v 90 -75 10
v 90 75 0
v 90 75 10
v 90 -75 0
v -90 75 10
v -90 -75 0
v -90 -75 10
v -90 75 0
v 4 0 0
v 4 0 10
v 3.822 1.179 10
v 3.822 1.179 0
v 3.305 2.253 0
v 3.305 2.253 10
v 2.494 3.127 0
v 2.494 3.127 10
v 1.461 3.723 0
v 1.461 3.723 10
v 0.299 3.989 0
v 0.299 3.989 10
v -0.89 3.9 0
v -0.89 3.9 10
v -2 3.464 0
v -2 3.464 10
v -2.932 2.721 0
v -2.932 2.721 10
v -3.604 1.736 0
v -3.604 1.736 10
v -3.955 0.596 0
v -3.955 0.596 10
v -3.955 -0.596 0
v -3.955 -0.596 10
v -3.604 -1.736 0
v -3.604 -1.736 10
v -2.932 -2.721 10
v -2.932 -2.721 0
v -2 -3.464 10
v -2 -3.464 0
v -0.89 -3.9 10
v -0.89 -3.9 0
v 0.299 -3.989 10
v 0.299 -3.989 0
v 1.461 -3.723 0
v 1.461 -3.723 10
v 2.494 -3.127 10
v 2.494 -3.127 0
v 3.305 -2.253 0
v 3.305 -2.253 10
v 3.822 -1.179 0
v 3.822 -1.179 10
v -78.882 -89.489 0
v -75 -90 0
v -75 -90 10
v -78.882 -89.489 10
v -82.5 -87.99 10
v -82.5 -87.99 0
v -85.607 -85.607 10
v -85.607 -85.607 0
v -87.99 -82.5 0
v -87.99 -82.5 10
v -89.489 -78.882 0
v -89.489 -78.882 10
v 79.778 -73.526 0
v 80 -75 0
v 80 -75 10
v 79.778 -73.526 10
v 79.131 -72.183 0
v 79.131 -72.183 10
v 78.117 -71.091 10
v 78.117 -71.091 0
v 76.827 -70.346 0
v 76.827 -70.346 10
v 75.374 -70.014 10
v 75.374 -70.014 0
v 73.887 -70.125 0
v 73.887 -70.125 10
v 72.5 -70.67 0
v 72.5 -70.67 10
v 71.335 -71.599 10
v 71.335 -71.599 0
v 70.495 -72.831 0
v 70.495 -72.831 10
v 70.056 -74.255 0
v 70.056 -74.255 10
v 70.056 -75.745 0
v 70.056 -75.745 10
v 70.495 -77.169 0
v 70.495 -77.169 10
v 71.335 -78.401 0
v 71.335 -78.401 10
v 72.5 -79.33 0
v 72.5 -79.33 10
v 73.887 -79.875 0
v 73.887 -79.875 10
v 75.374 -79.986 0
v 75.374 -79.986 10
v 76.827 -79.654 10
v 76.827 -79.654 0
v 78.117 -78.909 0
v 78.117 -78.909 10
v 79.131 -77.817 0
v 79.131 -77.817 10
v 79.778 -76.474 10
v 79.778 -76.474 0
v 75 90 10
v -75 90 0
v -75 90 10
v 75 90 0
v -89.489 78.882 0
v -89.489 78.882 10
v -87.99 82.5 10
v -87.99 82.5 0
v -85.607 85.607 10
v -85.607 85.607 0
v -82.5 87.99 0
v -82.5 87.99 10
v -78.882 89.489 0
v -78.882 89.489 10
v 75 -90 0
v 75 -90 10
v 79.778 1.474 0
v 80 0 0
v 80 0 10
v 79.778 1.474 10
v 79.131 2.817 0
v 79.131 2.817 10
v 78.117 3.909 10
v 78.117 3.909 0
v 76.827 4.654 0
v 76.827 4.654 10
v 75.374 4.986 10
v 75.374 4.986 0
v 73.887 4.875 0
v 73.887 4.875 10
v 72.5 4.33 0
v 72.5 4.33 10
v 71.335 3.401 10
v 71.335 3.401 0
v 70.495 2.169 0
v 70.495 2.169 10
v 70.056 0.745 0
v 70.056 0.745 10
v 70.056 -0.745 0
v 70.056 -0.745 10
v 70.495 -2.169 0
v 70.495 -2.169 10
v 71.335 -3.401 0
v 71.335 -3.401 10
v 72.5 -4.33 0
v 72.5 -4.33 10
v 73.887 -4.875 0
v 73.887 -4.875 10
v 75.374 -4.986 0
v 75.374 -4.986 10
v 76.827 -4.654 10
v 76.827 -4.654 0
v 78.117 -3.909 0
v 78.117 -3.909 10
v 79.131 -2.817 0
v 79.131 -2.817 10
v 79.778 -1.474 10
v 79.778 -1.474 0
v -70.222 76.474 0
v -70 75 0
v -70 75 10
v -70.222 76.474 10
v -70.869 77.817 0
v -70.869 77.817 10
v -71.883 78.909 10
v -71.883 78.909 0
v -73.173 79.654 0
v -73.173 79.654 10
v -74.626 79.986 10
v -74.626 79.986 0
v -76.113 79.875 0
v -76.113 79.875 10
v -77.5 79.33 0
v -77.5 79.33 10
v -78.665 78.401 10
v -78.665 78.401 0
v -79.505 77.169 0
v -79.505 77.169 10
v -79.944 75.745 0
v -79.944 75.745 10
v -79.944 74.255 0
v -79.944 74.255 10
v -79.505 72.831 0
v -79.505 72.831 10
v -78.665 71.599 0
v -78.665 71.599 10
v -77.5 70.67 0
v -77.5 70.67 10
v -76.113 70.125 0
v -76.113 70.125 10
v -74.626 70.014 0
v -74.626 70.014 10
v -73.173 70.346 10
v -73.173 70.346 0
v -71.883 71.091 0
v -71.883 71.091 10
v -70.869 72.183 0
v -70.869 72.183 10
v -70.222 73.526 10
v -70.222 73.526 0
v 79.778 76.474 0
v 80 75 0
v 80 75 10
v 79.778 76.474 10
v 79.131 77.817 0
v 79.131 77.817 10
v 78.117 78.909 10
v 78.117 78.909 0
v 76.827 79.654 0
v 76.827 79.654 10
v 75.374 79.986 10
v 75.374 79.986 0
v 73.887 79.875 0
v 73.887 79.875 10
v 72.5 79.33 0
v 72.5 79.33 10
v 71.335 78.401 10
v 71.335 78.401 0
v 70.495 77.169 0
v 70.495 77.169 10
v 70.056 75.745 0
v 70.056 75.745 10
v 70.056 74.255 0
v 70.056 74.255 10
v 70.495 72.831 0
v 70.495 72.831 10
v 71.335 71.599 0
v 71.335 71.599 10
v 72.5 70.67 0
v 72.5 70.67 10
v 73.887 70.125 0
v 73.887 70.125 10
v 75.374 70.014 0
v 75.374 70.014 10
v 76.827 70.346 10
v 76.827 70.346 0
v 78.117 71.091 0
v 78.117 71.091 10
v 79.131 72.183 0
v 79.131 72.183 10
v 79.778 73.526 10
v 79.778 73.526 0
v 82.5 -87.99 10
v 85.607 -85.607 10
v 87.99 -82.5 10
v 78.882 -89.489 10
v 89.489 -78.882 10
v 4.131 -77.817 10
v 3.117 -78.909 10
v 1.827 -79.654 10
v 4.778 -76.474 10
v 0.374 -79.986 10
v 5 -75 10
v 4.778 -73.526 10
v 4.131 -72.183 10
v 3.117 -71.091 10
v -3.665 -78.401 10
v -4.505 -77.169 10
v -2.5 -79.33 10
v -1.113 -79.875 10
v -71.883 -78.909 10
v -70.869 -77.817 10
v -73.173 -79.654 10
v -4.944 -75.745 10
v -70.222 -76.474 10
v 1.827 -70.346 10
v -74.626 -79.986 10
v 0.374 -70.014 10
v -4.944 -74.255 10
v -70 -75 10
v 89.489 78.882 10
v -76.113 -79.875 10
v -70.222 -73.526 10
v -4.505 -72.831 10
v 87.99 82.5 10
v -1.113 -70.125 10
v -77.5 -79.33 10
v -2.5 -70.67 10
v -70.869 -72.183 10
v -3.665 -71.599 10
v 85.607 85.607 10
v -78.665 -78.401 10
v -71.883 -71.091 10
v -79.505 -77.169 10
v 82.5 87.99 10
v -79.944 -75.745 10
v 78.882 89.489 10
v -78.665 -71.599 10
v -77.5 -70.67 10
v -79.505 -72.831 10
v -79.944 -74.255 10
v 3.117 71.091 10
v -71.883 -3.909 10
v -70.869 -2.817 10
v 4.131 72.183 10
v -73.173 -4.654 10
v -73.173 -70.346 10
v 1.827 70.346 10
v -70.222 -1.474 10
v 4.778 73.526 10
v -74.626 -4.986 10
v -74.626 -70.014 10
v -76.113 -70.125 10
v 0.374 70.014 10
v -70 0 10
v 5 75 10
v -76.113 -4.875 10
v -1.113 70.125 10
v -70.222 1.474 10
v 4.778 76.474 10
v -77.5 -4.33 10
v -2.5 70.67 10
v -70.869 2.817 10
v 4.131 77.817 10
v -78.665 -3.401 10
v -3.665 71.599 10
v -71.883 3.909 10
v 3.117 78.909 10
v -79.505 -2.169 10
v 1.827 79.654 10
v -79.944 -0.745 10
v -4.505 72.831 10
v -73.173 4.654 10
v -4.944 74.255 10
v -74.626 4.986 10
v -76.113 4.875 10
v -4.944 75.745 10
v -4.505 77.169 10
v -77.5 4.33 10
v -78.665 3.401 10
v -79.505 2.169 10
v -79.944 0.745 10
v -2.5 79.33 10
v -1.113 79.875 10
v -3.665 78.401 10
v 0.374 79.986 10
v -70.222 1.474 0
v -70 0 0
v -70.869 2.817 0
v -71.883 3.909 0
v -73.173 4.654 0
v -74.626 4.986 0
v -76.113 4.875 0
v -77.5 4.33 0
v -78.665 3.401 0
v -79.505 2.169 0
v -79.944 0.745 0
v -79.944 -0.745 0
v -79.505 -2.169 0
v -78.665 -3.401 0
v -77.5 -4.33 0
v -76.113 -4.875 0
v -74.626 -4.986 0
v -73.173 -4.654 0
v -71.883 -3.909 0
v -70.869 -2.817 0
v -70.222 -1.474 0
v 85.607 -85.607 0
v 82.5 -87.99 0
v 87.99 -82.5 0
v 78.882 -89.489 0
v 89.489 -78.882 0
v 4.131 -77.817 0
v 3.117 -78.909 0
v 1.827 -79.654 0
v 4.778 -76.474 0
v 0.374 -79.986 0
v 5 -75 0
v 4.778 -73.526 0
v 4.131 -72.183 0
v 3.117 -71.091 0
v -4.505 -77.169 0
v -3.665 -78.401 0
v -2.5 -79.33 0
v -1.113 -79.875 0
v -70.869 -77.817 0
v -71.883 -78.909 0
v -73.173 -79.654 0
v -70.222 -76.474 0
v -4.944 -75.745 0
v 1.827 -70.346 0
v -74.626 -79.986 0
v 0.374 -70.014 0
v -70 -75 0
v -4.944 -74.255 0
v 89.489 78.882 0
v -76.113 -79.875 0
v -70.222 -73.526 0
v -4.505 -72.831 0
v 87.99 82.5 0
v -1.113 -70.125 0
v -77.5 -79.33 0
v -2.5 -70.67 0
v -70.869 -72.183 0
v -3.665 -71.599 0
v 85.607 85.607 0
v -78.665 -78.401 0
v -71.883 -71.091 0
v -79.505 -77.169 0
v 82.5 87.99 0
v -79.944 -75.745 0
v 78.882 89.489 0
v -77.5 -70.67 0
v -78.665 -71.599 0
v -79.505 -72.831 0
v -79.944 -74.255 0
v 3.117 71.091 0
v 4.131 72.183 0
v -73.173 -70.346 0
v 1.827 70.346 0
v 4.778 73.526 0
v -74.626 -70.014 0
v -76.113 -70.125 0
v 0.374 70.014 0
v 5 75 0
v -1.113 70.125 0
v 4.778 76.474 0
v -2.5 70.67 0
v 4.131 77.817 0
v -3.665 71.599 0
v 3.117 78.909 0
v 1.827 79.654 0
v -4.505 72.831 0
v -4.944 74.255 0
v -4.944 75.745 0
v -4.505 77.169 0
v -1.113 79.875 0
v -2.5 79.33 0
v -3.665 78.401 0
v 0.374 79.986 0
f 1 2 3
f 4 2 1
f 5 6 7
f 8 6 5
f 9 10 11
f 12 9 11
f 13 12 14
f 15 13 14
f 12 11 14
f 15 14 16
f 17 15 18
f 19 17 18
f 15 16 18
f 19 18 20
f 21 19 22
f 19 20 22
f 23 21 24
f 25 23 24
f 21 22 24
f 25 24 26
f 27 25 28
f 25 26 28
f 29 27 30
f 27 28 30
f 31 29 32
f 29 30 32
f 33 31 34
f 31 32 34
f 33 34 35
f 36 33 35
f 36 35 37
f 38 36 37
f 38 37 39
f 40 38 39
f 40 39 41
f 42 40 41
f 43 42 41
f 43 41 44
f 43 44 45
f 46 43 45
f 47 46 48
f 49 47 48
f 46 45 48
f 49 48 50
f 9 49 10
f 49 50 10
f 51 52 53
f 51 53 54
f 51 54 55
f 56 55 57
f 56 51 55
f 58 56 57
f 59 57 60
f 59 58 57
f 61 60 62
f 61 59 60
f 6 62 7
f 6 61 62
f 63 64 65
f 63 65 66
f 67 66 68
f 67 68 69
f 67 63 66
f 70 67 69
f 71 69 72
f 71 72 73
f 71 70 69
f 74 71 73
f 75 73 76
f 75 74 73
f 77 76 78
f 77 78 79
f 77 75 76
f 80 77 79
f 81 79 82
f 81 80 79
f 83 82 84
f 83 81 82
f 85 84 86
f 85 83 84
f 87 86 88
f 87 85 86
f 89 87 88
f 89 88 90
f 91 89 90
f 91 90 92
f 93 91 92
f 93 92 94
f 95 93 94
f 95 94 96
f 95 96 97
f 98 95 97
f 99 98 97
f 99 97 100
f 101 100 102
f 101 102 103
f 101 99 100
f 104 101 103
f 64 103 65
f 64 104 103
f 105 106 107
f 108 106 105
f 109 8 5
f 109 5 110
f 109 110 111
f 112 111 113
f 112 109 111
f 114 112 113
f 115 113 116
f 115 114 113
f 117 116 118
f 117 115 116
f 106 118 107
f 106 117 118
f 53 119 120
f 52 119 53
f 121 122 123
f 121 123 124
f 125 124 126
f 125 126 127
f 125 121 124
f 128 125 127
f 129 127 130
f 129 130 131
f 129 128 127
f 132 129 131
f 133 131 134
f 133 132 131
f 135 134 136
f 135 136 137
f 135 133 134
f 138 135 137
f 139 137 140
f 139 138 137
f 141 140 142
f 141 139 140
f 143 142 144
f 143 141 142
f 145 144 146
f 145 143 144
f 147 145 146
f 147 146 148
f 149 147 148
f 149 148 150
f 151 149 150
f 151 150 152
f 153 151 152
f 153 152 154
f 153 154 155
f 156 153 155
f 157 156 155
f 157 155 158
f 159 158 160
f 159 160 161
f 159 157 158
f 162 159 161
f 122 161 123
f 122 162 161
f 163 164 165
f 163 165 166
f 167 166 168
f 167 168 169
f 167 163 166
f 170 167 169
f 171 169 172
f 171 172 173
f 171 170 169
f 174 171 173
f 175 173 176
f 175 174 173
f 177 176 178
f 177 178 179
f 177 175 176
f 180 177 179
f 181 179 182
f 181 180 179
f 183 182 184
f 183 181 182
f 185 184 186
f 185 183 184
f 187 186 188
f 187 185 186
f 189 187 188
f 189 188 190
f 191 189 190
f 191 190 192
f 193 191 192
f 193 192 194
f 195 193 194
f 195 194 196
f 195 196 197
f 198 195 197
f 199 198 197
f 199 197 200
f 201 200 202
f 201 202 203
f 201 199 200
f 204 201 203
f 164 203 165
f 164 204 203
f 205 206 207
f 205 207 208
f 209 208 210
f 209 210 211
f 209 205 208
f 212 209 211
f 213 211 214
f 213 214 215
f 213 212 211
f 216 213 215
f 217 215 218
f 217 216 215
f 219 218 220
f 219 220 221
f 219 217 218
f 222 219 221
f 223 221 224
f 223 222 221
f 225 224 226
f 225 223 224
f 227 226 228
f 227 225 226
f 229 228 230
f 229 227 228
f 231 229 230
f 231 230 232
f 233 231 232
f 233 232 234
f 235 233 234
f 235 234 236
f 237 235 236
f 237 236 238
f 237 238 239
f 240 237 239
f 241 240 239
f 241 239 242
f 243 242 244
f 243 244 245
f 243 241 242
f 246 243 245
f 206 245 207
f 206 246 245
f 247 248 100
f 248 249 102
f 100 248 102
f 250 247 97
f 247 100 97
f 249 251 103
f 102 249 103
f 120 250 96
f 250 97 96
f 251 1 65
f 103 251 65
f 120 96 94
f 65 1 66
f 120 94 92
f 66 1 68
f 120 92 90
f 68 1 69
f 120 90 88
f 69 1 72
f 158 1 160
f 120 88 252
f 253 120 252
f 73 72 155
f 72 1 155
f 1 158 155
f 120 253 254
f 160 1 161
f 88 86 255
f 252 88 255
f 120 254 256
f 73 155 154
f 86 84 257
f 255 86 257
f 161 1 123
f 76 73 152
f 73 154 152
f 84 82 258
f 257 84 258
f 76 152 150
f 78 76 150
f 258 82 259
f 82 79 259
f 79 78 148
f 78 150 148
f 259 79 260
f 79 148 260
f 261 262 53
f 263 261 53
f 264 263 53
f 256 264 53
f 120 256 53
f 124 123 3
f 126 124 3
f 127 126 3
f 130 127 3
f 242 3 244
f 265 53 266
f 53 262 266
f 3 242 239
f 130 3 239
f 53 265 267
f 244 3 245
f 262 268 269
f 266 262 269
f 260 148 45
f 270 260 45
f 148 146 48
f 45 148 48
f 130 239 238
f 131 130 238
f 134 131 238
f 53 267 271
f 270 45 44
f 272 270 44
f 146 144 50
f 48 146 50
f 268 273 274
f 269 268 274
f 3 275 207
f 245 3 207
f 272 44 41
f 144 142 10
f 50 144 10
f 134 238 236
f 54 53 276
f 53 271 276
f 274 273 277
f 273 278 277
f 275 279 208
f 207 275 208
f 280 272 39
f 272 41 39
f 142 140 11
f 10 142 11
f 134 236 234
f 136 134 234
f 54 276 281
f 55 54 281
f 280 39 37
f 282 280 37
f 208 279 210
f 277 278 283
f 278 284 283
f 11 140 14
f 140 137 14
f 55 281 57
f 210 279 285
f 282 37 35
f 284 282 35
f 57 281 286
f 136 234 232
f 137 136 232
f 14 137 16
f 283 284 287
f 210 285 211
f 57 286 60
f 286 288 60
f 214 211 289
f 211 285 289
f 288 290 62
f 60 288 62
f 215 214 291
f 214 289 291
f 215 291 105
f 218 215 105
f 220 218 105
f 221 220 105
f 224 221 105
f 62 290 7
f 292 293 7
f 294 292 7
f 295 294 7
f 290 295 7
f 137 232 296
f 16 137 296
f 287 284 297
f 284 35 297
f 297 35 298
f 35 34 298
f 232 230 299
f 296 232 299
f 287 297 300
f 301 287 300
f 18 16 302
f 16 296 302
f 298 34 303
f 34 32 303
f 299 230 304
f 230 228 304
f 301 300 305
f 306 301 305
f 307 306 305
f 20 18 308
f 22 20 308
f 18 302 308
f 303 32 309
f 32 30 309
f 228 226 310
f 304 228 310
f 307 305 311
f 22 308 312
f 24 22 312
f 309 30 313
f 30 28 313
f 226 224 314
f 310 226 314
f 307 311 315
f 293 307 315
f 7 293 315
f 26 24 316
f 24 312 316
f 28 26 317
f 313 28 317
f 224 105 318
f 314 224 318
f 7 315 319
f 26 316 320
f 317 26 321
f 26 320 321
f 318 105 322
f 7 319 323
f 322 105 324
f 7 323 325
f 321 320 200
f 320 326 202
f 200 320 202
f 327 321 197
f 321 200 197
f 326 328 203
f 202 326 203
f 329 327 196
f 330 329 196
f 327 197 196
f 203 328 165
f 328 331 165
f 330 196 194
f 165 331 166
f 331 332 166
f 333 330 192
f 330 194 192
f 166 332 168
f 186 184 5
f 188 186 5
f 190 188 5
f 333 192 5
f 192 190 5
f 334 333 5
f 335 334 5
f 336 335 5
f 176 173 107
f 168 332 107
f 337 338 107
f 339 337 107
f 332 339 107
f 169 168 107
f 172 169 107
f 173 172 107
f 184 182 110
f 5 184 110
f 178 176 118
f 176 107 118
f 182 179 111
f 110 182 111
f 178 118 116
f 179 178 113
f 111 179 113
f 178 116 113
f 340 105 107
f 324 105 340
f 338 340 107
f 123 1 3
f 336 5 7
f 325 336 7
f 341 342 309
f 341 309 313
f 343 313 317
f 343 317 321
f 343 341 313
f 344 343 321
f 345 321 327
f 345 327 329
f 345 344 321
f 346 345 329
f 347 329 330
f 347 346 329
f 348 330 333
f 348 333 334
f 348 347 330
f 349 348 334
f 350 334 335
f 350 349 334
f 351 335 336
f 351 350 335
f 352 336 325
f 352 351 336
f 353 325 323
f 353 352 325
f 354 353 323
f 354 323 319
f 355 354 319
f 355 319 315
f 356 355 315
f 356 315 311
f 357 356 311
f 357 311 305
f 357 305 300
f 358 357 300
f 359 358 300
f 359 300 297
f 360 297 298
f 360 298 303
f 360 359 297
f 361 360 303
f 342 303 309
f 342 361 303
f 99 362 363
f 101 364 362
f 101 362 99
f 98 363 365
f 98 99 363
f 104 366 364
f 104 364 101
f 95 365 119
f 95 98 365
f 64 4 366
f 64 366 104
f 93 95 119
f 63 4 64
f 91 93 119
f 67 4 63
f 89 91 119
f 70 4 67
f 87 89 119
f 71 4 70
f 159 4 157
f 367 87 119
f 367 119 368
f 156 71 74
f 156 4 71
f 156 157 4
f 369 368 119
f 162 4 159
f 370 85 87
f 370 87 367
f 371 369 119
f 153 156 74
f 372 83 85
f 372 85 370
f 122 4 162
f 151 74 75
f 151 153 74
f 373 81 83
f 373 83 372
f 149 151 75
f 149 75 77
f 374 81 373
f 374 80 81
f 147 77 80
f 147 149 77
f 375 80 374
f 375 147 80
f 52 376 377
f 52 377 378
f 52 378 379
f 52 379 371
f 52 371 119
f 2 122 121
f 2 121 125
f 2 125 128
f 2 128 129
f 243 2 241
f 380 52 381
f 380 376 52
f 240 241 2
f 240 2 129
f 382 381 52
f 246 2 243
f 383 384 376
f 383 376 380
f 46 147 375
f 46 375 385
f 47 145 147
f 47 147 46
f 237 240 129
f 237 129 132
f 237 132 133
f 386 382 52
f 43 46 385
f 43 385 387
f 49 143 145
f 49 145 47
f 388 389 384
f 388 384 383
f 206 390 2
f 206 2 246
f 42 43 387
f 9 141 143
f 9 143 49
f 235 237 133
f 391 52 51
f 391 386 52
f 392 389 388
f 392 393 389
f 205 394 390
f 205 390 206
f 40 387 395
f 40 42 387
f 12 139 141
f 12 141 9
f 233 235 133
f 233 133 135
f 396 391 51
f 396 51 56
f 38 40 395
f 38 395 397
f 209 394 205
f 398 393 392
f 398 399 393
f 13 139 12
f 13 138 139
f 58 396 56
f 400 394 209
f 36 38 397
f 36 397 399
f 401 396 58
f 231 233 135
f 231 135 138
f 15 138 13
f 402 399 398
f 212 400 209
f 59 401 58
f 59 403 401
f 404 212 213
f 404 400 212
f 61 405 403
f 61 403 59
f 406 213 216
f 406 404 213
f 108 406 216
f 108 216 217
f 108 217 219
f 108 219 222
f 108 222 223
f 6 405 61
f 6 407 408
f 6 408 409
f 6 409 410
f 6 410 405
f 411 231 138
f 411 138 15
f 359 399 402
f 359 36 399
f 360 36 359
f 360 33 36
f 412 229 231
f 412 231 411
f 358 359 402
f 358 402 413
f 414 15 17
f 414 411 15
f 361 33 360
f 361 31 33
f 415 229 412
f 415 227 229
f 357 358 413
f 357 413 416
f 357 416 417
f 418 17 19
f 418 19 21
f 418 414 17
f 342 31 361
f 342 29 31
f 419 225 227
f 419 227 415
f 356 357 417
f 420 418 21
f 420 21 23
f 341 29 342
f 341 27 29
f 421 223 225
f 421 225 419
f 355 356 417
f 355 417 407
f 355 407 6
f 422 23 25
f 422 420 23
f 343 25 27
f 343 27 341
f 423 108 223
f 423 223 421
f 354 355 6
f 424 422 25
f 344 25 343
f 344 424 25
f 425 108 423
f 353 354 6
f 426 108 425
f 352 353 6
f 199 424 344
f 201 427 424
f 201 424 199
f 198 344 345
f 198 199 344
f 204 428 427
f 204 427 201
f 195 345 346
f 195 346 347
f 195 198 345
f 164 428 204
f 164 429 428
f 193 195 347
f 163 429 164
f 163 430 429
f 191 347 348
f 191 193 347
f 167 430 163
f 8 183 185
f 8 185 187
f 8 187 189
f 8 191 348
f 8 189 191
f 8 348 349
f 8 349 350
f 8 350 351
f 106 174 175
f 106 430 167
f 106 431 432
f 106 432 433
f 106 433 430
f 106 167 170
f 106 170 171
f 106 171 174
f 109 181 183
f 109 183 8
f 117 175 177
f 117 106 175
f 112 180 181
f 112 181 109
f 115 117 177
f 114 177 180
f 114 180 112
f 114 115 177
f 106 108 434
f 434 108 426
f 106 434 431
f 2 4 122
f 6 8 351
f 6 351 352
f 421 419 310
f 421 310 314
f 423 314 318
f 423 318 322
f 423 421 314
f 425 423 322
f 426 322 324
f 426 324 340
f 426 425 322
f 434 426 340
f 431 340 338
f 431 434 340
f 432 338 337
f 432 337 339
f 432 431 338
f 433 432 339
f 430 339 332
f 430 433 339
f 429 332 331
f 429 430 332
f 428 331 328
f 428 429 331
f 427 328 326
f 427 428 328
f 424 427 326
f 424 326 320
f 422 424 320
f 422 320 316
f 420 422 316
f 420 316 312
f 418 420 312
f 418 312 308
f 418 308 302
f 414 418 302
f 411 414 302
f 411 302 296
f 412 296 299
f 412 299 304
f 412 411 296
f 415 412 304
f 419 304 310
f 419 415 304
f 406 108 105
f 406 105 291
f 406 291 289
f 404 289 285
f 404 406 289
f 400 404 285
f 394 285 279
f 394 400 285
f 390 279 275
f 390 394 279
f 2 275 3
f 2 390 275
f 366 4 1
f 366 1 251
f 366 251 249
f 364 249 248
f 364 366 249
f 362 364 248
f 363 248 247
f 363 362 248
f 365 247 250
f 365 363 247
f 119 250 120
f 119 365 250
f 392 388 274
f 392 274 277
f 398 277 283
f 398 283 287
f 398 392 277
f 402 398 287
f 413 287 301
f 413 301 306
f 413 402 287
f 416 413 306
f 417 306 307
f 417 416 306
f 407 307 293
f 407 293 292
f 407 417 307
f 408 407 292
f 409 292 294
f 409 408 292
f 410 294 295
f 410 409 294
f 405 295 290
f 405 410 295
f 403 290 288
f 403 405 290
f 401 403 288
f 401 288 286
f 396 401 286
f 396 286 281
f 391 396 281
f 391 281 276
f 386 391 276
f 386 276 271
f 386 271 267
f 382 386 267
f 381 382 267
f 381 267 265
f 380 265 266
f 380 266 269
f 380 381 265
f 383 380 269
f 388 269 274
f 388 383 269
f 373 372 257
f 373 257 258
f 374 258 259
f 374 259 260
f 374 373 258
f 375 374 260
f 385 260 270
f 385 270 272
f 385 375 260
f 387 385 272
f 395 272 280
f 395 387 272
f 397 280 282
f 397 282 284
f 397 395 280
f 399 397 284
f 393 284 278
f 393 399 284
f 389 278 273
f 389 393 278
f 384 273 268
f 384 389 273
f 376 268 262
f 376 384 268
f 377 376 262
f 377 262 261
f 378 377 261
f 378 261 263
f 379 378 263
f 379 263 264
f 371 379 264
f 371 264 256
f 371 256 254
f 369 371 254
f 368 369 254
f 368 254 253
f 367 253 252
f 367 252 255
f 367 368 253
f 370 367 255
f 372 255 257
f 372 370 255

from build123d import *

# Parameters (mm, degrees)
SKETCH2_R           = 5
BOSS_EXTRUDE1_DEPTH = 10
SKETCH3_R           = 4
CUT_EXTRUDE1_DEPTH  = 10


with BuildPart() as part:
    # Sketch2 → Boss-Extrude1 (new body)
    with BuildSketch(Plane.XY):
        with BuildLine():
            Line((-75, 90), (75, 90))
            ThreePointArc((75, 90), (85.606601718, 85.606601718), (90, 75))
            Line((90, 75), (90, -75))
            ThreePointArc((90, -75), (85.606601718, -85.606601718), (75, -90))
            Line((75, -90), (-75, -90))
            ThreePointArc((-75, -90), (-85.606601718, -85.606601718), (-90, -75))
            Line((-90, -75), (-90, 75))
            ThreePointArc((-90, 75), (-85.606601718, 85.606601718), (-75, 90))
        make_face()
        with Locations((-75, 75)):
            Circle(SKETCH2_R, mode=Mode.SUBTRACT)
        with Locations((0, 75)):
            Circle(SKETCH2_R, mode=Mode.SUBTRACT)
        with Locations((75, 75)):
            Circle(SKETCH2_R, mode=Mode.SUBTRACT)
        with Locations((-75, 0)):
            Circle(SKETCH2_R, mode=Mode.SUBTRACT)
        with Locations((75, 0)):
            Circle(SKETCH2_R, mode=Mode.SUBTRACT)
        with Locations((-75, -75)):
            Circle(SKETCH2_R, mode=Mode.SUBTRACT)
        with Locations((0, -75)):
            Circle(SKETCH2_R, mode=Mode.SUBTRACT)
        with Locations((75, -75)):
            Circle(SKETCH2_R, mode=Mode.SUBTRACT)
    extrude(amount=BOSS_EXTRUDE1_DEPTH)

    # Sketch3 → Cut-Extrude1 (cut)
    with BuildSketch(Plane.XY.offset(10)):
        Circle(SKETCH3_R)
    extrude(amount=-CUT_EXTRUDE1_DEPTH, mode=Mode.SUBTRACT)


solid = part.part
